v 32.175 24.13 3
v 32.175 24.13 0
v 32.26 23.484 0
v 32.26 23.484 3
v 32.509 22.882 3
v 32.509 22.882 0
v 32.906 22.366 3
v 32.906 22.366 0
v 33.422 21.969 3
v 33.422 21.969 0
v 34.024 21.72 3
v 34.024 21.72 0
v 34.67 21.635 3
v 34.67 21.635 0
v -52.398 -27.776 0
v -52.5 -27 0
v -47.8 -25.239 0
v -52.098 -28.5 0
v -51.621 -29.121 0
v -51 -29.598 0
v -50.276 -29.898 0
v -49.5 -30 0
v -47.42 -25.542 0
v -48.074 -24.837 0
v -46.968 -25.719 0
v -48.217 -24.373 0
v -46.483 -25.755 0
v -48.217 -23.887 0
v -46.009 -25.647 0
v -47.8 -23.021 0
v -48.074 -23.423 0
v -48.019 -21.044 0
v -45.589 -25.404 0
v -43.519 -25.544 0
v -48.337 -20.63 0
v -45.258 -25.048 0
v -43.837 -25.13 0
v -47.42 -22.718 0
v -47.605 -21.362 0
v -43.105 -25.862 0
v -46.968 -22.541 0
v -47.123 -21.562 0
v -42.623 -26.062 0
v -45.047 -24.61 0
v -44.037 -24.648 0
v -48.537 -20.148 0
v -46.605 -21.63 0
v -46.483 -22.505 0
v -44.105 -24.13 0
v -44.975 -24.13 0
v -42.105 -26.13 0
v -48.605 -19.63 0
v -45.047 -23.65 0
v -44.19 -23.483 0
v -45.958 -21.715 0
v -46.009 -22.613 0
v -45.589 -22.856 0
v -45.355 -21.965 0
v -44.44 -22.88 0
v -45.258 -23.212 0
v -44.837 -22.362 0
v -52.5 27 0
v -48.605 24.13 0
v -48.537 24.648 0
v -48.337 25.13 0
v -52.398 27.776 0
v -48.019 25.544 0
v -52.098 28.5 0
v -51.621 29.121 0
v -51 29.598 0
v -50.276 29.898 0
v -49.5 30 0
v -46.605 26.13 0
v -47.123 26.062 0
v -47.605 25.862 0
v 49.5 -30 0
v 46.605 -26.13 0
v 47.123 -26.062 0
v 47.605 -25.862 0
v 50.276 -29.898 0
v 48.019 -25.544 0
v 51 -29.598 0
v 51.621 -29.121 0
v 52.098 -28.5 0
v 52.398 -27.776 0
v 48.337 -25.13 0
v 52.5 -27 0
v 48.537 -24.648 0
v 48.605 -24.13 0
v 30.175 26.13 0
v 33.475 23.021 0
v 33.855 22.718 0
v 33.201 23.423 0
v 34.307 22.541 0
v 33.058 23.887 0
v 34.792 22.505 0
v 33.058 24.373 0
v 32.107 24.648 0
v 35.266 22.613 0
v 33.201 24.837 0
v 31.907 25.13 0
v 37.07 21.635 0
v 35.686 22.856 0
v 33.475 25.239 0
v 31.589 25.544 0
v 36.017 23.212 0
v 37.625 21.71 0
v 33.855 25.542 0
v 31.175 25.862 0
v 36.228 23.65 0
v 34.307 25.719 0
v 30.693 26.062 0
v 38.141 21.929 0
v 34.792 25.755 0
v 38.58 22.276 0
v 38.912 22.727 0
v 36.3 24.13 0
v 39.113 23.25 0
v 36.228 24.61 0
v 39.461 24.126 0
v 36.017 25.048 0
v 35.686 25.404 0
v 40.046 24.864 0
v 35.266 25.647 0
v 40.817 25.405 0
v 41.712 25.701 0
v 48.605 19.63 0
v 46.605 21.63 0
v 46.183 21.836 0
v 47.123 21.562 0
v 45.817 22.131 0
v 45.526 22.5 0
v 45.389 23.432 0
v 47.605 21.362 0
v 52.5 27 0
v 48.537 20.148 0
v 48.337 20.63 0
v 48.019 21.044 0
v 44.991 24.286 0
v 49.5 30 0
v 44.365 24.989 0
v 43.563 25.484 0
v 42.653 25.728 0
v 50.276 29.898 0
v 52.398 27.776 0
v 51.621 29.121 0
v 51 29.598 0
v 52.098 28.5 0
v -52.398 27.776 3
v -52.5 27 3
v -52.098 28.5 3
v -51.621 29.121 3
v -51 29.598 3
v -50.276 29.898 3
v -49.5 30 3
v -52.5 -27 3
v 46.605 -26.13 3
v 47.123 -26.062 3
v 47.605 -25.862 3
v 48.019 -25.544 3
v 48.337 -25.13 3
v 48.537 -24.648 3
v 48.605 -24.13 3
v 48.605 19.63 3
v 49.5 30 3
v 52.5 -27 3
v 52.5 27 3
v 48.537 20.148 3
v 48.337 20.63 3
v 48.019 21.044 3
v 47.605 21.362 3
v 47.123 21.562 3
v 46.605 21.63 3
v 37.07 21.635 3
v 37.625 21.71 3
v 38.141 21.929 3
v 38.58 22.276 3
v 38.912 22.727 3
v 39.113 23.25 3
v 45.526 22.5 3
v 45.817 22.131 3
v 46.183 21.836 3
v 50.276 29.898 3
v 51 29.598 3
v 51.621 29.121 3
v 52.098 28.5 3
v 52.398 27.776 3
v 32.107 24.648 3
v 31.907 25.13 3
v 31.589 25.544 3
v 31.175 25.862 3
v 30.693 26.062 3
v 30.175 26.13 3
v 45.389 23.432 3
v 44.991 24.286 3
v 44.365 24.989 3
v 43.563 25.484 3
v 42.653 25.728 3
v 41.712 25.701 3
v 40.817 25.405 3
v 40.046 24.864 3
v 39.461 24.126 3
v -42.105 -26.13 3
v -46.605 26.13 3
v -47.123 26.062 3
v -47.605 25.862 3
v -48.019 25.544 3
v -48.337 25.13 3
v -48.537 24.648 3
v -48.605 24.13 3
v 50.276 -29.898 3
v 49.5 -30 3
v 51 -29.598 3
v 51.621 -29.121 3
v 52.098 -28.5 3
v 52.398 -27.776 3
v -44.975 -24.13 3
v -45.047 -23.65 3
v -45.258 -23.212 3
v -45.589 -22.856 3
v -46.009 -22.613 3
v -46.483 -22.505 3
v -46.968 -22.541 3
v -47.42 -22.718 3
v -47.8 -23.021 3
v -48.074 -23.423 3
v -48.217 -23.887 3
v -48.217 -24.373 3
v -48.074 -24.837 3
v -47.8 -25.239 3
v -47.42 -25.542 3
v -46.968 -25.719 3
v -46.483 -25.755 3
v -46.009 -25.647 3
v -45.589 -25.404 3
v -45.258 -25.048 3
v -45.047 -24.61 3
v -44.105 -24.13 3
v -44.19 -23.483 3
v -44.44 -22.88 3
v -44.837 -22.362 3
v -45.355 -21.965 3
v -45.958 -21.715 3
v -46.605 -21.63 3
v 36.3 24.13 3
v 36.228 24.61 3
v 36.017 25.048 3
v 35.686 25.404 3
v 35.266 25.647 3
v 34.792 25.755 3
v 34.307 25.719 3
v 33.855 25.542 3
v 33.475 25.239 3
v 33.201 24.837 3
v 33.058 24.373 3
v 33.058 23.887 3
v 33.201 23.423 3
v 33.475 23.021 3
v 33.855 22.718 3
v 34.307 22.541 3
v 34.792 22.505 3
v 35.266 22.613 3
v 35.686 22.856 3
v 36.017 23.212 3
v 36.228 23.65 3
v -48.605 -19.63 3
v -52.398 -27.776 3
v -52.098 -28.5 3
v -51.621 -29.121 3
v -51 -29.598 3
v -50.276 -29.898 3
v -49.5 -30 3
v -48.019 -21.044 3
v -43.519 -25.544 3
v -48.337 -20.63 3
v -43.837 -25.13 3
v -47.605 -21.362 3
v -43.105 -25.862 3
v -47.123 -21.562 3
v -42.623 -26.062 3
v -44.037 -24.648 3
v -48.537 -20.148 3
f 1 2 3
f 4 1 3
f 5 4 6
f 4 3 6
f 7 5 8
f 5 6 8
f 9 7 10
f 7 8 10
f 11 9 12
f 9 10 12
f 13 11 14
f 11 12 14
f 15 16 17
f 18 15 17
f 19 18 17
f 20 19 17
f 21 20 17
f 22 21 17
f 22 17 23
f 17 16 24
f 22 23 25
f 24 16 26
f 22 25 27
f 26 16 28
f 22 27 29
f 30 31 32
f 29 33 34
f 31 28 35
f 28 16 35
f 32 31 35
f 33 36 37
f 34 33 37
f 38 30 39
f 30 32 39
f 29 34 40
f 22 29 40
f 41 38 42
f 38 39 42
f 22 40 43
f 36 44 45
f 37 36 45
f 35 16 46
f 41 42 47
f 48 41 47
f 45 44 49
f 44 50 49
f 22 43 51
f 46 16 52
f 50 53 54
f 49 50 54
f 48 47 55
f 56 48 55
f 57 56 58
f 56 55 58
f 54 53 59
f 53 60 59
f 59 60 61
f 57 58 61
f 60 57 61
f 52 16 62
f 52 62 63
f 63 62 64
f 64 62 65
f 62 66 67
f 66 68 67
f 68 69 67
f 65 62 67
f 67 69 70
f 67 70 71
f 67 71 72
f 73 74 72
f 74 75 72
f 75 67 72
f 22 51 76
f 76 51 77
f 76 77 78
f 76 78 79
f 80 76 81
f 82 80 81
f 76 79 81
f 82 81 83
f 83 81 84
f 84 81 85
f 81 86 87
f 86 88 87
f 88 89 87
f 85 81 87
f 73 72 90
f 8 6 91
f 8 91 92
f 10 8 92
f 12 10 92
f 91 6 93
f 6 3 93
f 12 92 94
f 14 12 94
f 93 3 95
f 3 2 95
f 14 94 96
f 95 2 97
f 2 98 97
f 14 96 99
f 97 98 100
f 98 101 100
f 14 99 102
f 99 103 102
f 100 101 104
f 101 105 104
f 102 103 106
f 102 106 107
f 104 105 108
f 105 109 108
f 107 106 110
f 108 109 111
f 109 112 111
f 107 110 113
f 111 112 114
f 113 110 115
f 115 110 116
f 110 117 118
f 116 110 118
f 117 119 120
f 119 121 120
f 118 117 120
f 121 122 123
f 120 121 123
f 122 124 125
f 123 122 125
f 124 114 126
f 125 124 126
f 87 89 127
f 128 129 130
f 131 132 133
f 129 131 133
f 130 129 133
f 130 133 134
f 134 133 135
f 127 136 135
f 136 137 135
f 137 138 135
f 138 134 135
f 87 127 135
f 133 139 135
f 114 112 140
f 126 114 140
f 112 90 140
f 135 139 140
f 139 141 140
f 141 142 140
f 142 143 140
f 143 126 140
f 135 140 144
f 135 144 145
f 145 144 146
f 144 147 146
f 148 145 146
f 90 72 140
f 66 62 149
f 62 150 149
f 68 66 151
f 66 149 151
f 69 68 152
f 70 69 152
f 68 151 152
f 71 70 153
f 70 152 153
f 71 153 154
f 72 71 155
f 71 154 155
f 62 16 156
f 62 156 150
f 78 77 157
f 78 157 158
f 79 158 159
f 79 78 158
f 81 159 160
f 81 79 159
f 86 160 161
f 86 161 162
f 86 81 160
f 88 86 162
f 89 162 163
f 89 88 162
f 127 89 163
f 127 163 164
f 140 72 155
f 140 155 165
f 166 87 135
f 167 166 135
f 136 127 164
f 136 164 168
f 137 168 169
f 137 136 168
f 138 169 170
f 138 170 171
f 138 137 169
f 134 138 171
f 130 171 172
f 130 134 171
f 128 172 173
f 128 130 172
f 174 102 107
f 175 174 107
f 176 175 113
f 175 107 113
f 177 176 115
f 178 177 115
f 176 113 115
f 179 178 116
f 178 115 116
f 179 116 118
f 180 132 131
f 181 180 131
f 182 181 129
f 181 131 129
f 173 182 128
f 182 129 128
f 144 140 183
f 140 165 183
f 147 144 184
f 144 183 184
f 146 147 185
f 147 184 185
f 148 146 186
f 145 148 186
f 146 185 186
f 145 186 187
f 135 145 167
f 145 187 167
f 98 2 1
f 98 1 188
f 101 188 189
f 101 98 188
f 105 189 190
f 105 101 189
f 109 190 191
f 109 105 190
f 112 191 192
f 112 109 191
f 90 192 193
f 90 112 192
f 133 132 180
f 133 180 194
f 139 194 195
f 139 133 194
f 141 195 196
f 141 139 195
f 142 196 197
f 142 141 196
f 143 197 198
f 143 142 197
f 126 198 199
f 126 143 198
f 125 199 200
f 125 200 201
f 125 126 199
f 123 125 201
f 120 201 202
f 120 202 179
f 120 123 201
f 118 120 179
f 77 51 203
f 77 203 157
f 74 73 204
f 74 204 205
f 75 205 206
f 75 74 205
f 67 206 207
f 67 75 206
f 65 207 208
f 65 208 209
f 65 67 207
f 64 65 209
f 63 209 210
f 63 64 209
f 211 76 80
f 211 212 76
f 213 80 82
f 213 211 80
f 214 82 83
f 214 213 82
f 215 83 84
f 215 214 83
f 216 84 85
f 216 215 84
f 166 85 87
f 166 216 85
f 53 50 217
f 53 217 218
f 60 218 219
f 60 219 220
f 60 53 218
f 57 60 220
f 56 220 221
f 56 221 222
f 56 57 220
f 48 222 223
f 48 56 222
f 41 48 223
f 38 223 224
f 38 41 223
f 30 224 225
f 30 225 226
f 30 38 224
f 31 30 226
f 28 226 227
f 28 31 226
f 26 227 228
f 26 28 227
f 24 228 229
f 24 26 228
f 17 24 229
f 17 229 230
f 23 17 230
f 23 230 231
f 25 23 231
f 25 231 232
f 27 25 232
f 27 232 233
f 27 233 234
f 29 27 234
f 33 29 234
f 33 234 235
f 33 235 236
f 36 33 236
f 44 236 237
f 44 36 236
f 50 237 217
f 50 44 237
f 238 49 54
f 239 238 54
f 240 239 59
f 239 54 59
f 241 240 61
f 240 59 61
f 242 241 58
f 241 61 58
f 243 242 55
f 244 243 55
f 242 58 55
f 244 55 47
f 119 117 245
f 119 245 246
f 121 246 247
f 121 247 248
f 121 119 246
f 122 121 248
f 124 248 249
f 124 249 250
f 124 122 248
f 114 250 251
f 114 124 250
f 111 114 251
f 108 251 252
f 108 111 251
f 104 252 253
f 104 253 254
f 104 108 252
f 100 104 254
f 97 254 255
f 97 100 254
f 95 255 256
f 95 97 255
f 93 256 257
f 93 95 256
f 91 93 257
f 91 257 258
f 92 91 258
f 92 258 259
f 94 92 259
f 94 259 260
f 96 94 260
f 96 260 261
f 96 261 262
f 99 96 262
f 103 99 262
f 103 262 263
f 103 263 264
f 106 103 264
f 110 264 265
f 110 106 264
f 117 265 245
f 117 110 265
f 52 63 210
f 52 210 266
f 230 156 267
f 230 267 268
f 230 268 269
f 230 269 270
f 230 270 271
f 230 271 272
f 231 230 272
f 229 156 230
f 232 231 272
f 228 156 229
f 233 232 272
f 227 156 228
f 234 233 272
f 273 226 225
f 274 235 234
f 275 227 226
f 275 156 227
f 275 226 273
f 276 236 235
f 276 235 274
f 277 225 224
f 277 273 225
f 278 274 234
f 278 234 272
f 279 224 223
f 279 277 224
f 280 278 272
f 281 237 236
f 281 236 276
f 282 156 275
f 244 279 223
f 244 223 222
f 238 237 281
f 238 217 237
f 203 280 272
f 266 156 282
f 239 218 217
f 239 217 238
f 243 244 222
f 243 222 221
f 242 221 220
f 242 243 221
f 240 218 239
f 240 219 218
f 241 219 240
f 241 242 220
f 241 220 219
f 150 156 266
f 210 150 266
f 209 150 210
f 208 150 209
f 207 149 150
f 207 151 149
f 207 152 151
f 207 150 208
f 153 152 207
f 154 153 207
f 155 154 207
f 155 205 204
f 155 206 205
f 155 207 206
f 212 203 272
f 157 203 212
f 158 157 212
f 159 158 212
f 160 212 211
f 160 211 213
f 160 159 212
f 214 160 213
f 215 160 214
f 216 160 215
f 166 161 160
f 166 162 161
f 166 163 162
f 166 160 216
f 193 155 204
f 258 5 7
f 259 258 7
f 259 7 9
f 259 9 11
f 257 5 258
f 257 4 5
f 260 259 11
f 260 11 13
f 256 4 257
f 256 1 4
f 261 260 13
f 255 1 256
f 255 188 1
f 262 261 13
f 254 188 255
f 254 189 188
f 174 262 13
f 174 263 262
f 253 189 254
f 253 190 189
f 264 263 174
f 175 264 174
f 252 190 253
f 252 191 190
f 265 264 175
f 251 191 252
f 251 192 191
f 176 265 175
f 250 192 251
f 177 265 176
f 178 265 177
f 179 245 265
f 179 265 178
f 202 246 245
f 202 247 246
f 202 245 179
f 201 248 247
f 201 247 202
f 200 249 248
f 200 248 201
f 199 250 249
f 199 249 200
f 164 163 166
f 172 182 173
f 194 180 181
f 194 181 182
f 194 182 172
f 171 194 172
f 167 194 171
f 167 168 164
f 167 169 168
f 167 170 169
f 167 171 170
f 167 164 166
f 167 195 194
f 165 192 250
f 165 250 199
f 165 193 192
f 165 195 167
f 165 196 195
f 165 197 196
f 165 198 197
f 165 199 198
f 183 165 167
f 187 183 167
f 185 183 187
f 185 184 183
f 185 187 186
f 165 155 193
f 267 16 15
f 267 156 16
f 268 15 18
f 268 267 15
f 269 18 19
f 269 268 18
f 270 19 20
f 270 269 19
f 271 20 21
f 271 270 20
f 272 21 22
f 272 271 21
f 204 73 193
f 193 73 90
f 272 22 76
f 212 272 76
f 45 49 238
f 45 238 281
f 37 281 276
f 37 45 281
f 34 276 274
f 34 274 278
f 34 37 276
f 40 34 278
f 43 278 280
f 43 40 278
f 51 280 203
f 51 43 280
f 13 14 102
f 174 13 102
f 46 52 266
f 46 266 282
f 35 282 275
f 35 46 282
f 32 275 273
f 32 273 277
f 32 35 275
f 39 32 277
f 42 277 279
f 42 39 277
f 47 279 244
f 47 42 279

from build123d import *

# Parameters (mm, degrees)
SKETCH_W  = 105
SKETCH_H  = 60
SKETCH_R  = 1.63
PAD_DEPTH = 3
FILLET_R  = 3


with BuildPart() as part:
    # Sketch → Pad (new body)
    with BuildSketch(Plane.XY):
        Rectangle(SKETCH_W, SKETCH_H)
        with Locations((-46.605, -24.13)):
            Circle(SKETCH_R, mode=Mode.SUBTRACT)
        with Locations((34.67, 24.13)):
            Circle(SKETCH_R, mode=Mode.SUBTRACT)
        with BuildLine():
            ThreePointArc((-44.105, -24.13), (-44.837233, -22.362233), (-46.605, -21.63))
            ThreePointArc((-48.605, -19.63), (-48.019214, -21.044214), (-46.605, -21.63))
            Line((-48.605, 24.13), (-48.605, -19.63))
            ThreePointArc((-46.605, 26.13), (-48.019214, 25.544214), (-48.605, 24.13))
            Line((-46.605, 26.13), (30.175, 26.13))
            ThreePointArc((32.175, 24.13), (31.589213, 25.544214), (30.175, 26.13))
            ThreePointArc((32.175, 24.13), (32.905768, 22.365769), (34.67, 21.635))
            Line((34.67, 21.635), (37.07, 21.635))
            ThreePointArc((37.07, 21.635), (38.372303, 22.087576), (39.113281, 23.250234))
            ThreePointArc((45.525503, 22.5), (42.653179, 25.727981), (39.113281, 23.250234))
            ThreePointArc((45.525503, 22.5), (45.991385, 21.973349), (46.605, 21.630008))
            ThreePointArc((48.605, 19.630008), (48.019214, 21.044222), (46.605, 21.630008))
            Line((48.605, -24.129992), (48.605, 19.630008))
            ThreePointArc((46.605, -26.13), (48.019217, -25.544211), (48.605, -24.129992))
            Line((-42.105, -26.13), (46.605, -26.13))
            ThreePointArc((-44.105, -24.13), (-43.519214, -25.544214), (-42.105, -26.13))
        make_face(mode=Mode.SUBTRACT)
    extrude(amount=PAD_DEPTH)

    # Fillet
    fillet_edges = [part.edges().sort_by_distance(p)[0] for p in [
        (52.5, -30, 1.5),
        (-52.5, -30, 1.5),
        (-52.5, 30, 1.5),
        (52.5, 30, 1.5),
    ]]
    fillet(fillet_edges, radius=FILLET_R)


solid = part.part
